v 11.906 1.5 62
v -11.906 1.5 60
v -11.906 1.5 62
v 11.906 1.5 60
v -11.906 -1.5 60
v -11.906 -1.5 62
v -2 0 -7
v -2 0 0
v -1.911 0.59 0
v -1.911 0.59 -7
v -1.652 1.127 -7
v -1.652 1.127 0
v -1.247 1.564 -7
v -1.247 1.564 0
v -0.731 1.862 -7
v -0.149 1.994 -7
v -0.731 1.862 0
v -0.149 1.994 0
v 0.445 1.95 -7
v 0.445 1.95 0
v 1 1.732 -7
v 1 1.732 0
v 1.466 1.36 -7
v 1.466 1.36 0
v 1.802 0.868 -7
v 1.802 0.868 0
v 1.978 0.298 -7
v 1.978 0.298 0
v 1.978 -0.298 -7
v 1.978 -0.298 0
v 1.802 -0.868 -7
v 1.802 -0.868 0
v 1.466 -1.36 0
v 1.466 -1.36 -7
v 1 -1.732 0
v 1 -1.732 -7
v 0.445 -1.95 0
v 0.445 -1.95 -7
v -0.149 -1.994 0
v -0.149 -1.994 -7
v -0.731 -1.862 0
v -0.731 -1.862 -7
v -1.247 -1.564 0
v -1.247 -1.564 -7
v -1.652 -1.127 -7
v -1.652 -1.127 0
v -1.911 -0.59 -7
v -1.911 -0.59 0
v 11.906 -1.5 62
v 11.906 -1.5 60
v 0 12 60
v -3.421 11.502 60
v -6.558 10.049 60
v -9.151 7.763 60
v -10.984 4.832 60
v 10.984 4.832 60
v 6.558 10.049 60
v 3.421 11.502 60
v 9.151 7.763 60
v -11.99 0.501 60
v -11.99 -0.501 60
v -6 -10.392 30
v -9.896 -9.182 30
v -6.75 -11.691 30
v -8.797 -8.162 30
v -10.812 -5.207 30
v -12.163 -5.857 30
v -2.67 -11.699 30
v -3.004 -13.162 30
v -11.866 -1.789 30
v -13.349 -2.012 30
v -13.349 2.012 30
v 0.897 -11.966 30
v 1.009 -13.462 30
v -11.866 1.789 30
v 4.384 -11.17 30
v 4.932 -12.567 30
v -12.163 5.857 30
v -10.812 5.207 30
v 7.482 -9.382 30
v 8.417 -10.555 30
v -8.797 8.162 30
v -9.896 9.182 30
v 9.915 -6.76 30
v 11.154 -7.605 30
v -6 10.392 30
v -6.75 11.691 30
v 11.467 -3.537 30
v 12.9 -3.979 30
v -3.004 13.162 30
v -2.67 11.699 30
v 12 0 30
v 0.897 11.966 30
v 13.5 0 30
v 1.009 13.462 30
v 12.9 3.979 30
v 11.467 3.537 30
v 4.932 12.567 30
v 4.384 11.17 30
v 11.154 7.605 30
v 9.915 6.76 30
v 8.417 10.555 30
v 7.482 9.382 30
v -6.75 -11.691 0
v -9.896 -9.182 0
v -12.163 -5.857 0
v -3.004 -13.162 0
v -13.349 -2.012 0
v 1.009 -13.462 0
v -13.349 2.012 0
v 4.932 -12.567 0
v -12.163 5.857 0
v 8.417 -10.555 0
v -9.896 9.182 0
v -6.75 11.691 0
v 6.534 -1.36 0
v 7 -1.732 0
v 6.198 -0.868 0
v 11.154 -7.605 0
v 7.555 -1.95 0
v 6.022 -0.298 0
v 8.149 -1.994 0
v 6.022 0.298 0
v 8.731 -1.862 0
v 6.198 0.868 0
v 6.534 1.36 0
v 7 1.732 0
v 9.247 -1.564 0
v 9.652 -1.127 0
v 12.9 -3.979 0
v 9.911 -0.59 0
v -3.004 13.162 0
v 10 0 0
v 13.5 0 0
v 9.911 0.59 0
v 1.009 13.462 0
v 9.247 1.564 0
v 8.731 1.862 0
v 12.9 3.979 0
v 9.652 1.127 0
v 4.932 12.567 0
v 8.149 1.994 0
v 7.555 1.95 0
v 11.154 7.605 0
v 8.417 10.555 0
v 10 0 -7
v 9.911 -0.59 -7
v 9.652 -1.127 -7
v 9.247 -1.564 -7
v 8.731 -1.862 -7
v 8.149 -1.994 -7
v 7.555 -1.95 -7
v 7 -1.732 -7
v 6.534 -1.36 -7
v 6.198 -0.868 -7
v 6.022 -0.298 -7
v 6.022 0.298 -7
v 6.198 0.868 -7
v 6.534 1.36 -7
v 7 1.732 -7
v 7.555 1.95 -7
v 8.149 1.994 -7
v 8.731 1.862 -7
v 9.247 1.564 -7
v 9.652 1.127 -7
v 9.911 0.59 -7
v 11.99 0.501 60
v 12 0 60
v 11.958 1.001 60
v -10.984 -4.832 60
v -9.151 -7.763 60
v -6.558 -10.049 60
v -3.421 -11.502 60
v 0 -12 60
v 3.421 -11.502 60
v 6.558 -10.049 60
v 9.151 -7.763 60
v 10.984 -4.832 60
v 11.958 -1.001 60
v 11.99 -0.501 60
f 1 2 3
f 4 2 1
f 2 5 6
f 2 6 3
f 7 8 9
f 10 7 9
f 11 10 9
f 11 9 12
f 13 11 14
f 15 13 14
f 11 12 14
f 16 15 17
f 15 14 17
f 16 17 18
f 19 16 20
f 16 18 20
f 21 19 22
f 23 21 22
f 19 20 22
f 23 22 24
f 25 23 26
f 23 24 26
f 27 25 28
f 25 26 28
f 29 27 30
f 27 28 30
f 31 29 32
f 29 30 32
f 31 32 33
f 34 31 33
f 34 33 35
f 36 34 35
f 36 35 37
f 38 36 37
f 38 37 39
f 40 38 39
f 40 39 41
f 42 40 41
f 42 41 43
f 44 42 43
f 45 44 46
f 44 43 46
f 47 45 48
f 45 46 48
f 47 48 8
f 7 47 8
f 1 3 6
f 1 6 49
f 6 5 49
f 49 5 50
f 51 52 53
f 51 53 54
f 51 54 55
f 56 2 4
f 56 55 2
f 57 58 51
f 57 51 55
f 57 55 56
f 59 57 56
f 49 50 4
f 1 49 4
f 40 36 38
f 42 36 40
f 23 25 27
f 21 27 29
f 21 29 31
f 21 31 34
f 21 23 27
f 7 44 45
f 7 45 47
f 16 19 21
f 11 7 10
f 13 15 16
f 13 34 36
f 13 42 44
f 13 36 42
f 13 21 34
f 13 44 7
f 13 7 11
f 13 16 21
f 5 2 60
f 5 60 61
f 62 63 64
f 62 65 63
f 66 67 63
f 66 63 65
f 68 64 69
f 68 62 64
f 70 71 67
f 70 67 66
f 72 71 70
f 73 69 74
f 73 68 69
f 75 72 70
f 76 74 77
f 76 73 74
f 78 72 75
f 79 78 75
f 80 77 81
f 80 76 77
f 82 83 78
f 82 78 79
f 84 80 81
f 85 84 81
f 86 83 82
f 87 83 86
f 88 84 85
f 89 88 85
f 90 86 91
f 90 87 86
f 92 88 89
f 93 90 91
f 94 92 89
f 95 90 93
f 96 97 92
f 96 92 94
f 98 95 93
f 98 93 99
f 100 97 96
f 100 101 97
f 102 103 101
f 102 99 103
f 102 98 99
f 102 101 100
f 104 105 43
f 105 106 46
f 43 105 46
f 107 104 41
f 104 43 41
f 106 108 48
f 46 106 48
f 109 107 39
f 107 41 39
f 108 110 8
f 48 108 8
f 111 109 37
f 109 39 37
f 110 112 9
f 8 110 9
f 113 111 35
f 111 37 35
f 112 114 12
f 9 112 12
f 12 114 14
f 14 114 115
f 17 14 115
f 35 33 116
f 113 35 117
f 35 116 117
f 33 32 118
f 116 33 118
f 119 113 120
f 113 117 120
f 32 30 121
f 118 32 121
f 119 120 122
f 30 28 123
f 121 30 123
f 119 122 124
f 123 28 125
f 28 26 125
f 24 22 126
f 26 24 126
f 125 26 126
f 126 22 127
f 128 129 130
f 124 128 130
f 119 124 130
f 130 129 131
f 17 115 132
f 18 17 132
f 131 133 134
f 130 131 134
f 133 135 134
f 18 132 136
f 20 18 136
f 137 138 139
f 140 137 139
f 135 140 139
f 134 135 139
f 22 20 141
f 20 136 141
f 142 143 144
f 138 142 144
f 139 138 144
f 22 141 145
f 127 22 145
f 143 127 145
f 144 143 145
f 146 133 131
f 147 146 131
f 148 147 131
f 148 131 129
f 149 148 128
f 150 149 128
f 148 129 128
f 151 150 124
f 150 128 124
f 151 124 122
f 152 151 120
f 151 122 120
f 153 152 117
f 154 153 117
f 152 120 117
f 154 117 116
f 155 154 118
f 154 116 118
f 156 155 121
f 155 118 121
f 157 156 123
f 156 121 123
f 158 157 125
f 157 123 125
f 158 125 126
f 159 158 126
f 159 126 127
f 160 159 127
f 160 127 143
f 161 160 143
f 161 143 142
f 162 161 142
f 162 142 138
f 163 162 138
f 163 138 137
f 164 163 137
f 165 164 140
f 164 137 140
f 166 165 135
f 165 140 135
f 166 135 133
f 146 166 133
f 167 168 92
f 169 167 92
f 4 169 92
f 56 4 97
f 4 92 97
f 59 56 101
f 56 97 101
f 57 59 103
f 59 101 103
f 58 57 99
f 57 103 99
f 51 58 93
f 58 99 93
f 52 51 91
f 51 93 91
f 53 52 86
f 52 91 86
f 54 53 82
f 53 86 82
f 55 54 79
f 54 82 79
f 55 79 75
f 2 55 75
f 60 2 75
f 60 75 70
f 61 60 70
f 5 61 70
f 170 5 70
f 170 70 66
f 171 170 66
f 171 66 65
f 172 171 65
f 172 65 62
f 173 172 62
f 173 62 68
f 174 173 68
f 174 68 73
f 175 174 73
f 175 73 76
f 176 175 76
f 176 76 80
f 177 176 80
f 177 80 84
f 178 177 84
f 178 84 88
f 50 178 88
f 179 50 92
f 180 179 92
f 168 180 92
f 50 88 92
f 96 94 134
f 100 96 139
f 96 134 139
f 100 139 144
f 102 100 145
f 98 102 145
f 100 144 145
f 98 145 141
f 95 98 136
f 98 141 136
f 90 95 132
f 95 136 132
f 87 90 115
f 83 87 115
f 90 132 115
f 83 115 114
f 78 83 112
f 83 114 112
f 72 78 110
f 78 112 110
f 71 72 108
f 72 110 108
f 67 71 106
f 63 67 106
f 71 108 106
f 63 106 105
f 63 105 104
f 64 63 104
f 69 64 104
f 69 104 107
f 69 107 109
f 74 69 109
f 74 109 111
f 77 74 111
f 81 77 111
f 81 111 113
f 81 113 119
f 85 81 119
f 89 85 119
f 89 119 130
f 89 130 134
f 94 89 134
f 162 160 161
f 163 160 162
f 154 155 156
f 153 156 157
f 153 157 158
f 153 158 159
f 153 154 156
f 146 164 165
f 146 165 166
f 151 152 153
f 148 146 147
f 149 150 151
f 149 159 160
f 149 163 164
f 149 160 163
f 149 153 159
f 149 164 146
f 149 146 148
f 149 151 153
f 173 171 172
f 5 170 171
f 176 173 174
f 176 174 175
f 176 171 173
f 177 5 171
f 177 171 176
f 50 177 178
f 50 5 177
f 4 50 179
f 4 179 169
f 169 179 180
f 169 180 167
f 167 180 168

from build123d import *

# Parameters (mm, degrees)
SKETCH1_R           = 13.5
BOSS_EXTRUDE1_DEPTH = 60
CUT_EXTRUDE1_START  = -30
SKETCH2_R           = 13.5
SKETCH2_R_2         = 12
CUT_EXTRUDE1_DEPTH  = 30
SKETCH3_R           = 2
BOSS_EXTRUDE2_DEPTH = 7
SKETCH4_W           = 23.8117618
SKETCH4_H           = 3
BOSS_EXTRUDE3_DEPTH = 2


with BuildPart() as part:
    # Sketch1 → Boss-Extrude1 (new body)
    with BuildSketch(Plane.XY):
        Circle(SKETCH1_R)
    extrude(amount=BOSS_EXTRUDE1_DEPTH)

    # Sketch2 → Cut-Extrude1 (cut)
    with BuildSketch(Plane.XY.offset(60).offset(CUT_EXTRUDE1_START)):
        Circle(SKETCH2_R)
        Circle(SKETCH2_R_2, mode=Mode.SUBTRACT)
    extrude(amount=CUT_EXTRUDE1_DEPTH, mode=Mode.SUBTRACT)

    # Sketch3 → Boss-Extrude2 (add)
    with BuildSketch(Plane(origin=(0, 0, 0), x_dir=(-1, 0, 0), z_dir=(0, 0, -1))):
        Circle(SKETCH3_R)
        with Locations(Location((-8, 0, 0), (0, 0, 180))):
            Circle(SKETCH3_R)
    extrude(amount=BOSS_EXTRUDE2_DEPTH)

    # Sketch4 → Boss-Extrude3 (add)
    with BuildSketch(Plane.XY.offset(60)):
        Rectangle(SKETCH4_W, SKETCH4_H)
    extrude(amount=BOSS_EXTRUDE3_DEPTH)


solid = part.part
